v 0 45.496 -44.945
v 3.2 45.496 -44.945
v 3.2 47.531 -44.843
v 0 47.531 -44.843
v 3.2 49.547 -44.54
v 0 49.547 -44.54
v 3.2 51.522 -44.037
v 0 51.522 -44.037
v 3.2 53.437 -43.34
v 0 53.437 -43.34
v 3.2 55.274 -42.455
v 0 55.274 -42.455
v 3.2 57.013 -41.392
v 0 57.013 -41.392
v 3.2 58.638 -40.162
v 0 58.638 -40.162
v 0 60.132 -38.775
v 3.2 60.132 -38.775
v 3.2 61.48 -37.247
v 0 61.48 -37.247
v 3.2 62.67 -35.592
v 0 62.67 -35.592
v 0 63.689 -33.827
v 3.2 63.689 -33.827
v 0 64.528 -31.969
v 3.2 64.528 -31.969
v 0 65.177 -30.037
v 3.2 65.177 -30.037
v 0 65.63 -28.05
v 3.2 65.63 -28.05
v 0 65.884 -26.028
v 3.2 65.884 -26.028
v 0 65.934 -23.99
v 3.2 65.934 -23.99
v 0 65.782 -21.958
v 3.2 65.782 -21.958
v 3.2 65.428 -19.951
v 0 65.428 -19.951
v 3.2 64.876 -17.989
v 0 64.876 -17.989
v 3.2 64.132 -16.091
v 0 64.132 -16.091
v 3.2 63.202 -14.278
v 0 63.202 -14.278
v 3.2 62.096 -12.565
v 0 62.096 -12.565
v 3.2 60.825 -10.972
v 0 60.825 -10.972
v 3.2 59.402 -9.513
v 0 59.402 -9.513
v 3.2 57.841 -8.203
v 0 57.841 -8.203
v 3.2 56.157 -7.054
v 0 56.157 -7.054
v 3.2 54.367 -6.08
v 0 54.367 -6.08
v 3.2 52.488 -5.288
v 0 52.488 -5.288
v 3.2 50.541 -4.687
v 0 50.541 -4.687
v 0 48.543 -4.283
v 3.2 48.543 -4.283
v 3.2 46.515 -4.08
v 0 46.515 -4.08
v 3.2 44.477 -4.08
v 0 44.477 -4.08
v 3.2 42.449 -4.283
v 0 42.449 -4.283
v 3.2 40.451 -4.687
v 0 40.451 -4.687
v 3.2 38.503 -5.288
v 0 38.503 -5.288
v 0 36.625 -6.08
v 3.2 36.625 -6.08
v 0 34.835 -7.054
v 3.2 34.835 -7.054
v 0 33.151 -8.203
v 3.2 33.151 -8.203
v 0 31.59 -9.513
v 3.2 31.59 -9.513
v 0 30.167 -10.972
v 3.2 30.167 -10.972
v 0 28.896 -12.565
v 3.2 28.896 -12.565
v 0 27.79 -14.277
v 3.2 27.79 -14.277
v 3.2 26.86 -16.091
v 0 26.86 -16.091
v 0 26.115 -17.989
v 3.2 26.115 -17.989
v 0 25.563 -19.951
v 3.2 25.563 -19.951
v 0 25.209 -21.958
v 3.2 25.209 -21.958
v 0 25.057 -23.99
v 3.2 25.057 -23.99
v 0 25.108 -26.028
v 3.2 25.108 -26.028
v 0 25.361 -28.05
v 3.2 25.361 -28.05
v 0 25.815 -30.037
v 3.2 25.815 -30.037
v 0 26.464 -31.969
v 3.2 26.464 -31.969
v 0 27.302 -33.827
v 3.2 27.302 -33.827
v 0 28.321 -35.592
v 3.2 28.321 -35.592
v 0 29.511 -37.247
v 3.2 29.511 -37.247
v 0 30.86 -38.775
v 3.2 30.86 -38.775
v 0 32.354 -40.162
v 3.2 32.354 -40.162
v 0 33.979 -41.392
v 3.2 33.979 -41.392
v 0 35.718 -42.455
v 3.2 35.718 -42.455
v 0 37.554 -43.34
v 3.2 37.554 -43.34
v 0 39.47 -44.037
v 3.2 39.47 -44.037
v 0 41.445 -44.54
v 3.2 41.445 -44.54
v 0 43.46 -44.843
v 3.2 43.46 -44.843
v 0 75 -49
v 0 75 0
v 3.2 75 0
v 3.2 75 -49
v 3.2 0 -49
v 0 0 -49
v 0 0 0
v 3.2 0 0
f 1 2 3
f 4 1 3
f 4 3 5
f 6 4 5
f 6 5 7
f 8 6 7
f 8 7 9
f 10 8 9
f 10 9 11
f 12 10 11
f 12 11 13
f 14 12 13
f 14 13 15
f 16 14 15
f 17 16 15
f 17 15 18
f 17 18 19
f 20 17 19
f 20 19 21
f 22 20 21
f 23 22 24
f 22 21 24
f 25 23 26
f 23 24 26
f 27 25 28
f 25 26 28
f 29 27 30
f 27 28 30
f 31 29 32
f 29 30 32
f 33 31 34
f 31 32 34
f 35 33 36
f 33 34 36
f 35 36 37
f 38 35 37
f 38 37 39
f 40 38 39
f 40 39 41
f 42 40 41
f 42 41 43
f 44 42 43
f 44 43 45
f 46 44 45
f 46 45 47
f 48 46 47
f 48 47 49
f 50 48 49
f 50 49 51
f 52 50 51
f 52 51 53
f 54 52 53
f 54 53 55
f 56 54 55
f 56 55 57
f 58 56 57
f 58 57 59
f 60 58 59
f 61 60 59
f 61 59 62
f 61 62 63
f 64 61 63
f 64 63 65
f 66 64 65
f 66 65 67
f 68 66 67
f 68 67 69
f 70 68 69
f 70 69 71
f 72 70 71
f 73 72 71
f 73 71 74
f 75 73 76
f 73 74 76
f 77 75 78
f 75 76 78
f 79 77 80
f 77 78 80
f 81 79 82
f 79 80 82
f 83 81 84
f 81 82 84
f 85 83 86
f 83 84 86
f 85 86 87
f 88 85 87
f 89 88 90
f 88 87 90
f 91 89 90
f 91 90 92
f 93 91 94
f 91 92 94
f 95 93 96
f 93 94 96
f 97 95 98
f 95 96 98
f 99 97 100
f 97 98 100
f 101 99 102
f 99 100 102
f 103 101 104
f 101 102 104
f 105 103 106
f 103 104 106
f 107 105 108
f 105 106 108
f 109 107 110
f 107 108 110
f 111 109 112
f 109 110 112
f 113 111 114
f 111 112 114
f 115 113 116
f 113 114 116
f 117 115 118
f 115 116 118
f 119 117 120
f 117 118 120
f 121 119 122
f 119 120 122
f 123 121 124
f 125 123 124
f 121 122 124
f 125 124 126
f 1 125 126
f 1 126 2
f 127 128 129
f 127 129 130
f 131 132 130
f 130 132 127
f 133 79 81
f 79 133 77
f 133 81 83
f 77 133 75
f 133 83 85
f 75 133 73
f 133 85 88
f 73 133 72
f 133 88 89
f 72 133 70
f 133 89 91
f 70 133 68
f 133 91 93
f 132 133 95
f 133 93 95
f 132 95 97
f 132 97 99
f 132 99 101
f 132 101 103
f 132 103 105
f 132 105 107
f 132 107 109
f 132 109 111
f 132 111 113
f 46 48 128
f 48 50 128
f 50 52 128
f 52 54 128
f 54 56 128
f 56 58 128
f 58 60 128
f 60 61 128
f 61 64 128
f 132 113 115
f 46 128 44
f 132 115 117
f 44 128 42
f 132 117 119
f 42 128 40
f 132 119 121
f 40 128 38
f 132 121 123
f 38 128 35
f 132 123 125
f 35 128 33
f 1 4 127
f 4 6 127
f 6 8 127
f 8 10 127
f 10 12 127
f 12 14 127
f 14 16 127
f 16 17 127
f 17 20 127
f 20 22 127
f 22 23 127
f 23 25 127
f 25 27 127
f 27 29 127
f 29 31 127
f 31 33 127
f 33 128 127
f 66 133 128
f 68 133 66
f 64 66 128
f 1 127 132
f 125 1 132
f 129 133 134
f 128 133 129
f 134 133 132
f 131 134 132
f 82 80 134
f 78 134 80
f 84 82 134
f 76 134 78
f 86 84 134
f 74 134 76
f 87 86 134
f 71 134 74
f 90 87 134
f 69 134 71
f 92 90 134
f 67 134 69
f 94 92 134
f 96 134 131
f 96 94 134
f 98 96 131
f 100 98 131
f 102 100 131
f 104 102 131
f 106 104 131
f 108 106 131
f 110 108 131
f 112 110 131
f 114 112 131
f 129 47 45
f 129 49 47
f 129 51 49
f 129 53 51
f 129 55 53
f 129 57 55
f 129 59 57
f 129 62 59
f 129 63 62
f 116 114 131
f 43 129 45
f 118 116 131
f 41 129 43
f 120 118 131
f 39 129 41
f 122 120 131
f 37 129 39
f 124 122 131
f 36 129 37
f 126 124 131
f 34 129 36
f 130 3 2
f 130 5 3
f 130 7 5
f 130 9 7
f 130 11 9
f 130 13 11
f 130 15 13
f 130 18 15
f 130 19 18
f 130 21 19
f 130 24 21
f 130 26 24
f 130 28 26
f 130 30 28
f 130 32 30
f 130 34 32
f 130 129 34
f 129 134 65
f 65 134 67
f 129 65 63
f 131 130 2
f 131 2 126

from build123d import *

# Parameters (mm, degrees)
SKETCH1_W           = 49
SKETCH1_H           = 75
BOSS_EXTRUDE1_DEPTH = 3.2
CUT_EXTRUDE1_REACH  = 5.2
SKETCH2_R           = 20.445


with BuildPart() as part:
    # Sketch1 → Boss-Extrude1 (new body)
    with BuildSketch(Plane(origin=(0, 0, 0), x_dir=(0, 0, -1), z_dir=(1, 0, 0))):
        with Locations((24.5, 37.5)):
            Rectangle(SKETCH1_W, SKETCH1_H)
    extrude(amount=BOSS_EXTRUDE1_DEPTH)

    # Sketch2 → Cut-Extrude1 (cut, up to next)
    with BuildSketch(Plane(origin=(3.2, 0, 0), x_dir=(0, 0, -1), z_dir=(1, 0, 0)), mode=Mode.PRIVATE) as cut_extrude1_sk1:
        with Locations((24.5, 45.495825453)):
            Circle(SKETCH2_R)
    cut_extrude1_tool1 = extrude(cut_extrude1_sk1.sketch, amount=-CUT_EXTRUDE1_REACH, mode=Mode.PRIVATE) & part.part
    add(cut_extrude1_tool1.solids().sort_by_distance((3.2, 45.495825, -24.5))[0], mode=Mode.SUBTRACT)


solid = part.part
